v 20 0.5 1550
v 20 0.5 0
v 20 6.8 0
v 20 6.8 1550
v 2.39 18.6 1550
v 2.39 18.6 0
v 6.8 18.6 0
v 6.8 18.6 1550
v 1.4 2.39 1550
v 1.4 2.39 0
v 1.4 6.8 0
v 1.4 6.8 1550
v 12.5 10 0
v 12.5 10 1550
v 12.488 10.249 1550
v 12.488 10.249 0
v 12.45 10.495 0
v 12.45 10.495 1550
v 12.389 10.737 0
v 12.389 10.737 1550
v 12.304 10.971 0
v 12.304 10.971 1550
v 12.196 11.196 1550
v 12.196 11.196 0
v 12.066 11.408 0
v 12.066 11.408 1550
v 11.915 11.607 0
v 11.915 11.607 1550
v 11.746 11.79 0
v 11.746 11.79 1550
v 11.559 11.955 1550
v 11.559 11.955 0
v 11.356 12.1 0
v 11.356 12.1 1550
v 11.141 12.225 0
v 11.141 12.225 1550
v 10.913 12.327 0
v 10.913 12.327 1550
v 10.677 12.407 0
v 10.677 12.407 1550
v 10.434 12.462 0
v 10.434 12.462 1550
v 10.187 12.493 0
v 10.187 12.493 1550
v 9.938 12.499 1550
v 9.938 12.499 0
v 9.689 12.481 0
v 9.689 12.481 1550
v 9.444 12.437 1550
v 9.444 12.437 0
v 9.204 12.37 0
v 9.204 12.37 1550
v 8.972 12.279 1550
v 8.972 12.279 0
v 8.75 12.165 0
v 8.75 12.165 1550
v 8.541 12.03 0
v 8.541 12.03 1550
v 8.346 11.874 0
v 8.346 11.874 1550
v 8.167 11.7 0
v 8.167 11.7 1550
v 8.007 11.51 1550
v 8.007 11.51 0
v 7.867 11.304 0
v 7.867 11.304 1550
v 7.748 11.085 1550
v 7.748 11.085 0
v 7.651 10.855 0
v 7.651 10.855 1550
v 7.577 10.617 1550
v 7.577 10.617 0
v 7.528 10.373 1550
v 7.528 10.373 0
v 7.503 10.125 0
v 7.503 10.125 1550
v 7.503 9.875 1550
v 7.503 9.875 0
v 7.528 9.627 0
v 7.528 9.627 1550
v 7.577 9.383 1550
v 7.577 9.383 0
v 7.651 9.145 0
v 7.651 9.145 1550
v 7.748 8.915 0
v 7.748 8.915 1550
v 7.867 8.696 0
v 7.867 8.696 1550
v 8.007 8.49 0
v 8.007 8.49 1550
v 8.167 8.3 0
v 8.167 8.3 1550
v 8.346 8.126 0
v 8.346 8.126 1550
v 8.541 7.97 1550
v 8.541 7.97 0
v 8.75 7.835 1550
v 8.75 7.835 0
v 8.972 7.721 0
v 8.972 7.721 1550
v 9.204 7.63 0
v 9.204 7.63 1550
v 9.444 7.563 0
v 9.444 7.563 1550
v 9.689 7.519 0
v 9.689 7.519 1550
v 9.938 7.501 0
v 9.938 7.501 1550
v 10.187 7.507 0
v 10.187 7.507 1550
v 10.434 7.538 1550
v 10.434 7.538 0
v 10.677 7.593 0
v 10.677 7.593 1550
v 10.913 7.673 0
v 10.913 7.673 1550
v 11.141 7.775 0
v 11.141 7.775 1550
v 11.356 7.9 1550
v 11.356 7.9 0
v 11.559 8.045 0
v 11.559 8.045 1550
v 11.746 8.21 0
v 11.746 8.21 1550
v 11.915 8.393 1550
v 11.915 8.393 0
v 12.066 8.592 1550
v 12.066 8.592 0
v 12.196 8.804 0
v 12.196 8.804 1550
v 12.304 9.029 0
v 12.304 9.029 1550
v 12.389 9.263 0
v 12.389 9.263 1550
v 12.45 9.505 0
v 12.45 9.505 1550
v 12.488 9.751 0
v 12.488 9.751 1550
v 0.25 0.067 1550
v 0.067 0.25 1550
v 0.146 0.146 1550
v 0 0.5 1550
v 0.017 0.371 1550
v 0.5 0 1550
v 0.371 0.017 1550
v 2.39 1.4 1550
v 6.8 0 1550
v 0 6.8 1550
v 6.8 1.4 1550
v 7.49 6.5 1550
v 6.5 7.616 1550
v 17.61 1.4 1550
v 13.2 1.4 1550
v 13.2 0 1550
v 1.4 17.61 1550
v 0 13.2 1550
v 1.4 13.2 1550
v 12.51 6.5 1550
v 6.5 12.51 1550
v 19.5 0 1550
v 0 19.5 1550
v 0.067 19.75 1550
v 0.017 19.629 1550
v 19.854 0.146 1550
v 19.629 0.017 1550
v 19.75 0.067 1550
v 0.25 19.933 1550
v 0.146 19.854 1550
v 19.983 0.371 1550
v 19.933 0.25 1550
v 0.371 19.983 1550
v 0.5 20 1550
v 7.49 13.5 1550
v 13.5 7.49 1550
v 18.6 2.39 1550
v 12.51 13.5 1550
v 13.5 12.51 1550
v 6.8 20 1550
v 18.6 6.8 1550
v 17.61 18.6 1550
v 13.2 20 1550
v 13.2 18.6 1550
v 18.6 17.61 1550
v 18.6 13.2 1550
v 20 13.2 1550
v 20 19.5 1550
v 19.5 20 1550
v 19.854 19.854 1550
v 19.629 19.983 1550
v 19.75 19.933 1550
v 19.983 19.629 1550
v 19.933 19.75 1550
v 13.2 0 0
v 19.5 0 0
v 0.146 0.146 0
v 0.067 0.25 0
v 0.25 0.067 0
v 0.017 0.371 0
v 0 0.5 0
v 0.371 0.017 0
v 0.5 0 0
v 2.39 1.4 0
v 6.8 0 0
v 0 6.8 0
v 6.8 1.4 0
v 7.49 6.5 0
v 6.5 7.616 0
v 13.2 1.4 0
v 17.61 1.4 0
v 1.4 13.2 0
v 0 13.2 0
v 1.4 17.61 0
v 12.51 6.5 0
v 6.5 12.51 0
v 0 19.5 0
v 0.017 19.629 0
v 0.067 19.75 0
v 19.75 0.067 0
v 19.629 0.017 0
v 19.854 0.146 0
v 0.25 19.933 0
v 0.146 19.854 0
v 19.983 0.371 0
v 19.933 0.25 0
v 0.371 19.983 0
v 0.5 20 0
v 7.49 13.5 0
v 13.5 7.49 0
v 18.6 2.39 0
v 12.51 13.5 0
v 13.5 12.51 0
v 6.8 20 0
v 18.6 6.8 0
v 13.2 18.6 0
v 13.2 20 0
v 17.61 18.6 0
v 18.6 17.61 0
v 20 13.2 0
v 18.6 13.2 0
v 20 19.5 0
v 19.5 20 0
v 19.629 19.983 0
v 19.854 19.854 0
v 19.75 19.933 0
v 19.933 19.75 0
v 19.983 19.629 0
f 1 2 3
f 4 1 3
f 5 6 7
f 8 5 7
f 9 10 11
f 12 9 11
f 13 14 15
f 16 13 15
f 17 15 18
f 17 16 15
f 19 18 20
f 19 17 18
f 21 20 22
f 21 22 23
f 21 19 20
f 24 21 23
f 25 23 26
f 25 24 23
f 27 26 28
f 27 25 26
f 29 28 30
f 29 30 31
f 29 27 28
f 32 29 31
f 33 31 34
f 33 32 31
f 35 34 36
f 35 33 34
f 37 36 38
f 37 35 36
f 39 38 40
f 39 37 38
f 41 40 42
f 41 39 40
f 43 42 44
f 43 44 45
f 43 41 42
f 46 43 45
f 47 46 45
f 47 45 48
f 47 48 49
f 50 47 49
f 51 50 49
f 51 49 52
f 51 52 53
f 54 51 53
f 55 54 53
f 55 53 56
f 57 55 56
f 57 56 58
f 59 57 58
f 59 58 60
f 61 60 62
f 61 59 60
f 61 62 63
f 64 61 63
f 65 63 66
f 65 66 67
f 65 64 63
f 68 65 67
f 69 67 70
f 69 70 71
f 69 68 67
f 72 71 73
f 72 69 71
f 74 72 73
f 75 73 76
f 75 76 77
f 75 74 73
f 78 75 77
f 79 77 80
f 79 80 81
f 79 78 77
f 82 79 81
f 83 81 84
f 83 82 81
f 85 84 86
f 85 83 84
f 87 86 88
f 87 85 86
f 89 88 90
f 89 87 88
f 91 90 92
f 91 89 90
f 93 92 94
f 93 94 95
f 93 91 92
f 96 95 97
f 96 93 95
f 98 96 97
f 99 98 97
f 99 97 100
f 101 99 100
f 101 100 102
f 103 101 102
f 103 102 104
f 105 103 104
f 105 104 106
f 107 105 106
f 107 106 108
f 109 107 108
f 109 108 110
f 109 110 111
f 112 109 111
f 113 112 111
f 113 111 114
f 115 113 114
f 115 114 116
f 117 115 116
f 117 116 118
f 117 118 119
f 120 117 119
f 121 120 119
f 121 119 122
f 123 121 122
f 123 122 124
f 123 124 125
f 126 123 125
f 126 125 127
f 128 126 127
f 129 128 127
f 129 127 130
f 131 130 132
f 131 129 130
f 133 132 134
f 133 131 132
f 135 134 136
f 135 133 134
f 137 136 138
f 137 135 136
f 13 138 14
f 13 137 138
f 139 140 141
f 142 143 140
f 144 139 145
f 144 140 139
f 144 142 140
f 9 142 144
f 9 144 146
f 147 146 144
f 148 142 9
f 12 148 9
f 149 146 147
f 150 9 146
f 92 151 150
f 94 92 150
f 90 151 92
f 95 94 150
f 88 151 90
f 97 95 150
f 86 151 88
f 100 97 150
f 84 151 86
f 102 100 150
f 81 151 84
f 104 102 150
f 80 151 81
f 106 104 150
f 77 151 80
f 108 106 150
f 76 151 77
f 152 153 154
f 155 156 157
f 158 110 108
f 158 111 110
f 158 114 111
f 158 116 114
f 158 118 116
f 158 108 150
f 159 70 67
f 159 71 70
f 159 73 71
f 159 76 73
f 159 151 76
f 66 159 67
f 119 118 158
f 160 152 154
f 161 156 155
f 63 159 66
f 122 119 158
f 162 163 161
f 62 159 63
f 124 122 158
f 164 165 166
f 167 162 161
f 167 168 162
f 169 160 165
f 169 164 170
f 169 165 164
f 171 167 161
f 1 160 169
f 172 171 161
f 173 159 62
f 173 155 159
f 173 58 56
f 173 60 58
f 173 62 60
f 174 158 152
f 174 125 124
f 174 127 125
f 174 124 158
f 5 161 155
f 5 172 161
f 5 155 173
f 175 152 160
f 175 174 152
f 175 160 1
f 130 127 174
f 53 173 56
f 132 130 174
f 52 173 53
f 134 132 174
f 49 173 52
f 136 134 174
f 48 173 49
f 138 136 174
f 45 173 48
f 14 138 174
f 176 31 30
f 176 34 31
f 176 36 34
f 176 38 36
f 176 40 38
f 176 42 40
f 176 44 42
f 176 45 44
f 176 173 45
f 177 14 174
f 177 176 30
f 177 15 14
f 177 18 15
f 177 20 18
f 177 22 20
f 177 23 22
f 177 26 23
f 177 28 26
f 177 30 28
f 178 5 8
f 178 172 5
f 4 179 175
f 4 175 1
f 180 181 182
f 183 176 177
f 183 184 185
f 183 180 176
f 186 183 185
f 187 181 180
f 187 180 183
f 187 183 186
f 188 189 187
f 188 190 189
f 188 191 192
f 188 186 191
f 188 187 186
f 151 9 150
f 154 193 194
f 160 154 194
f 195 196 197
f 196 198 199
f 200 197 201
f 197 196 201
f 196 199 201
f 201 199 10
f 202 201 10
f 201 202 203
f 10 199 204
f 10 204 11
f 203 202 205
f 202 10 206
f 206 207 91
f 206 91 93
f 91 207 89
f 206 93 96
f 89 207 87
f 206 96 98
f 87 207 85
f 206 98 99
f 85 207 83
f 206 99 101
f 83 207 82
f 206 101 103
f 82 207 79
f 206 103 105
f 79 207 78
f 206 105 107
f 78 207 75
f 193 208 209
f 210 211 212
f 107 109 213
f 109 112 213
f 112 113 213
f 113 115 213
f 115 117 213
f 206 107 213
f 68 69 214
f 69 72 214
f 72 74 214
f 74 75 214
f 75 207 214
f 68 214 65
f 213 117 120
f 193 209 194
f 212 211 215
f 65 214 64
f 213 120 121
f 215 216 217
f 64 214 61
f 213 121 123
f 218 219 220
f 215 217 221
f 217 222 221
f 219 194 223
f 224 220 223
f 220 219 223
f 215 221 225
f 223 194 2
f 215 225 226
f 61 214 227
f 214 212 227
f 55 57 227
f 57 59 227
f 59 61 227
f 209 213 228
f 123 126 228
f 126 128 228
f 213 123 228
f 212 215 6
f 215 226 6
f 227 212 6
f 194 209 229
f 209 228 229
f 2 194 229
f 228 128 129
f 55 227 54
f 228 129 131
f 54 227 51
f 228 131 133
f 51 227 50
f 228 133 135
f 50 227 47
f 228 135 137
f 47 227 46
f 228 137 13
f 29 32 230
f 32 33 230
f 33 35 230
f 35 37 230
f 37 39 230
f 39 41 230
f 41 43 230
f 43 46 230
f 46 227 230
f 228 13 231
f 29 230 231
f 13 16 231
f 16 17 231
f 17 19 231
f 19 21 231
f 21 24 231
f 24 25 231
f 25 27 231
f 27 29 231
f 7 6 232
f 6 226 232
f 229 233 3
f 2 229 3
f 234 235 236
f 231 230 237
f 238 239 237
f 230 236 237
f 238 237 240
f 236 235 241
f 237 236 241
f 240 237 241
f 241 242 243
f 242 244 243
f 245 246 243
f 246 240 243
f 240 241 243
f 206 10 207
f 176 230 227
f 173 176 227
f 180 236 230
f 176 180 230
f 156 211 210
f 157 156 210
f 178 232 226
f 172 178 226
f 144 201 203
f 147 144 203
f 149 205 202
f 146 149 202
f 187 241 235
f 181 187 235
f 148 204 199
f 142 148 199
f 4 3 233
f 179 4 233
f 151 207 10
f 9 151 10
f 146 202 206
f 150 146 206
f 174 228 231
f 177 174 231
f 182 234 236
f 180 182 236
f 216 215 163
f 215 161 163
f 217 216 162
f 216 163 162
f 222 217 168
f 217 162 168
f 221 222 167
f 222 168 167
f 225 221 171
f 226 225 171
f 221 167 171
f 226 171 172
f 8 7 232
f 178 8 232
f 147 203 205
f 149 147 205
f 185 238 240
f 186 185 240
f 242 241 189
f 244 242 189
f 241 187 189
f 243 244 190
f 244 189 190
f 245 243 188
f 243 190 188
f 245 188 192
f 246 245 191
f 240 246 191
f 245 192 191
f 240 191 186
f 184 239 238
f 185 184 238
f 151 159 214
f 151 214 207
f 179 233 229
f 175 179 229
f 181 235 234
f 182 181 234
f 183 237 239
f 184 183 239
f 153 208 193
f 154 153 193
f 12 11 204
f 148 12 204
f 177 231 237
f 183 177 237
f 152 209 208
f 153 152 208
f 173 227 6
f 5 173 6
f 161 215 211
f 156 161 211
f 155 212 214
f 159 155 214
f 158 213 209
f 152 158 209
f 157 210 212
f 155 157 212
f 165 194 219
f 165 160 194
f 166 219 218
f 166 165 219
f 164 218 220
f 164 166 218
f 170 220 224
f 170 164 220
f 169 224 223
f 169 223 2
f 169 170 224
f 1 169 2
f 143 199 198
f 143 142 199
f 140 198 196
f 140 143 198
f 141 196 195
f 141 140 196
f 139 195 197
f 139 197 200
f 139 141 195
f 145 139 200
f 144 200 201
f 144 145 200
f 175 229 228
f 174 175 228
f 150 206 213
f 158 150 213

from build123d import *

# Parameters (mm, degrees)
F0_R     = 2.5
F1_DEPTH = 1550
F2_R     = 0.5


with BuildPart() as f1:
    # F0 (on Top) → F1 (new body)
    with BuildSketch(Plane.XY):
        Polygon((6.5, 7.616114), (1.4, 2.389949), (1.4, 6.8), (0, 6.8), (0, 0), (6.8, 0), (6.8, 1.4), (2.389949, 1.4), (7.489949, 6.5), (12.510051, 6.5), (17.610051, 1.4), (13.2, 1.4), (13.2, 0), (20, 0), (20, 6.8), (18.6, 6.8), (18.6, 2.389949), (13.5, 7.489949), (13.5, 12.510051), (18.6, 17.610051), (18.6, 13.2), (20, 13.2), (20, 20), (13.2, 20), (13.2, 18.6), (17.610051, 18.6), (12.510051, 13.5), (7.489949, 13.5), (2.389949, 18.6), (6.8, 18.6), (6.8, 20), (0, 20), (0, 13.2), (1.4, 13.2), (1.4, 17.610051), (6.5, 12.510051), align=None)
        with Locations((10, 10)):
            Circle(F0_R, mode=Mode.SUBTRACT)
    extrude(amount=F1_DEPTH)

    # F2
    f2_edges = [f1.edges().sort_by_distance(p)[0] for p in [
        (0, 0, 775),
        (0, 20, 775),
        (20, 20, 775),
        (20, 0, 775),
    ]]
    fillet(f2_edges, radius=F2_R)


solid = f1.part
